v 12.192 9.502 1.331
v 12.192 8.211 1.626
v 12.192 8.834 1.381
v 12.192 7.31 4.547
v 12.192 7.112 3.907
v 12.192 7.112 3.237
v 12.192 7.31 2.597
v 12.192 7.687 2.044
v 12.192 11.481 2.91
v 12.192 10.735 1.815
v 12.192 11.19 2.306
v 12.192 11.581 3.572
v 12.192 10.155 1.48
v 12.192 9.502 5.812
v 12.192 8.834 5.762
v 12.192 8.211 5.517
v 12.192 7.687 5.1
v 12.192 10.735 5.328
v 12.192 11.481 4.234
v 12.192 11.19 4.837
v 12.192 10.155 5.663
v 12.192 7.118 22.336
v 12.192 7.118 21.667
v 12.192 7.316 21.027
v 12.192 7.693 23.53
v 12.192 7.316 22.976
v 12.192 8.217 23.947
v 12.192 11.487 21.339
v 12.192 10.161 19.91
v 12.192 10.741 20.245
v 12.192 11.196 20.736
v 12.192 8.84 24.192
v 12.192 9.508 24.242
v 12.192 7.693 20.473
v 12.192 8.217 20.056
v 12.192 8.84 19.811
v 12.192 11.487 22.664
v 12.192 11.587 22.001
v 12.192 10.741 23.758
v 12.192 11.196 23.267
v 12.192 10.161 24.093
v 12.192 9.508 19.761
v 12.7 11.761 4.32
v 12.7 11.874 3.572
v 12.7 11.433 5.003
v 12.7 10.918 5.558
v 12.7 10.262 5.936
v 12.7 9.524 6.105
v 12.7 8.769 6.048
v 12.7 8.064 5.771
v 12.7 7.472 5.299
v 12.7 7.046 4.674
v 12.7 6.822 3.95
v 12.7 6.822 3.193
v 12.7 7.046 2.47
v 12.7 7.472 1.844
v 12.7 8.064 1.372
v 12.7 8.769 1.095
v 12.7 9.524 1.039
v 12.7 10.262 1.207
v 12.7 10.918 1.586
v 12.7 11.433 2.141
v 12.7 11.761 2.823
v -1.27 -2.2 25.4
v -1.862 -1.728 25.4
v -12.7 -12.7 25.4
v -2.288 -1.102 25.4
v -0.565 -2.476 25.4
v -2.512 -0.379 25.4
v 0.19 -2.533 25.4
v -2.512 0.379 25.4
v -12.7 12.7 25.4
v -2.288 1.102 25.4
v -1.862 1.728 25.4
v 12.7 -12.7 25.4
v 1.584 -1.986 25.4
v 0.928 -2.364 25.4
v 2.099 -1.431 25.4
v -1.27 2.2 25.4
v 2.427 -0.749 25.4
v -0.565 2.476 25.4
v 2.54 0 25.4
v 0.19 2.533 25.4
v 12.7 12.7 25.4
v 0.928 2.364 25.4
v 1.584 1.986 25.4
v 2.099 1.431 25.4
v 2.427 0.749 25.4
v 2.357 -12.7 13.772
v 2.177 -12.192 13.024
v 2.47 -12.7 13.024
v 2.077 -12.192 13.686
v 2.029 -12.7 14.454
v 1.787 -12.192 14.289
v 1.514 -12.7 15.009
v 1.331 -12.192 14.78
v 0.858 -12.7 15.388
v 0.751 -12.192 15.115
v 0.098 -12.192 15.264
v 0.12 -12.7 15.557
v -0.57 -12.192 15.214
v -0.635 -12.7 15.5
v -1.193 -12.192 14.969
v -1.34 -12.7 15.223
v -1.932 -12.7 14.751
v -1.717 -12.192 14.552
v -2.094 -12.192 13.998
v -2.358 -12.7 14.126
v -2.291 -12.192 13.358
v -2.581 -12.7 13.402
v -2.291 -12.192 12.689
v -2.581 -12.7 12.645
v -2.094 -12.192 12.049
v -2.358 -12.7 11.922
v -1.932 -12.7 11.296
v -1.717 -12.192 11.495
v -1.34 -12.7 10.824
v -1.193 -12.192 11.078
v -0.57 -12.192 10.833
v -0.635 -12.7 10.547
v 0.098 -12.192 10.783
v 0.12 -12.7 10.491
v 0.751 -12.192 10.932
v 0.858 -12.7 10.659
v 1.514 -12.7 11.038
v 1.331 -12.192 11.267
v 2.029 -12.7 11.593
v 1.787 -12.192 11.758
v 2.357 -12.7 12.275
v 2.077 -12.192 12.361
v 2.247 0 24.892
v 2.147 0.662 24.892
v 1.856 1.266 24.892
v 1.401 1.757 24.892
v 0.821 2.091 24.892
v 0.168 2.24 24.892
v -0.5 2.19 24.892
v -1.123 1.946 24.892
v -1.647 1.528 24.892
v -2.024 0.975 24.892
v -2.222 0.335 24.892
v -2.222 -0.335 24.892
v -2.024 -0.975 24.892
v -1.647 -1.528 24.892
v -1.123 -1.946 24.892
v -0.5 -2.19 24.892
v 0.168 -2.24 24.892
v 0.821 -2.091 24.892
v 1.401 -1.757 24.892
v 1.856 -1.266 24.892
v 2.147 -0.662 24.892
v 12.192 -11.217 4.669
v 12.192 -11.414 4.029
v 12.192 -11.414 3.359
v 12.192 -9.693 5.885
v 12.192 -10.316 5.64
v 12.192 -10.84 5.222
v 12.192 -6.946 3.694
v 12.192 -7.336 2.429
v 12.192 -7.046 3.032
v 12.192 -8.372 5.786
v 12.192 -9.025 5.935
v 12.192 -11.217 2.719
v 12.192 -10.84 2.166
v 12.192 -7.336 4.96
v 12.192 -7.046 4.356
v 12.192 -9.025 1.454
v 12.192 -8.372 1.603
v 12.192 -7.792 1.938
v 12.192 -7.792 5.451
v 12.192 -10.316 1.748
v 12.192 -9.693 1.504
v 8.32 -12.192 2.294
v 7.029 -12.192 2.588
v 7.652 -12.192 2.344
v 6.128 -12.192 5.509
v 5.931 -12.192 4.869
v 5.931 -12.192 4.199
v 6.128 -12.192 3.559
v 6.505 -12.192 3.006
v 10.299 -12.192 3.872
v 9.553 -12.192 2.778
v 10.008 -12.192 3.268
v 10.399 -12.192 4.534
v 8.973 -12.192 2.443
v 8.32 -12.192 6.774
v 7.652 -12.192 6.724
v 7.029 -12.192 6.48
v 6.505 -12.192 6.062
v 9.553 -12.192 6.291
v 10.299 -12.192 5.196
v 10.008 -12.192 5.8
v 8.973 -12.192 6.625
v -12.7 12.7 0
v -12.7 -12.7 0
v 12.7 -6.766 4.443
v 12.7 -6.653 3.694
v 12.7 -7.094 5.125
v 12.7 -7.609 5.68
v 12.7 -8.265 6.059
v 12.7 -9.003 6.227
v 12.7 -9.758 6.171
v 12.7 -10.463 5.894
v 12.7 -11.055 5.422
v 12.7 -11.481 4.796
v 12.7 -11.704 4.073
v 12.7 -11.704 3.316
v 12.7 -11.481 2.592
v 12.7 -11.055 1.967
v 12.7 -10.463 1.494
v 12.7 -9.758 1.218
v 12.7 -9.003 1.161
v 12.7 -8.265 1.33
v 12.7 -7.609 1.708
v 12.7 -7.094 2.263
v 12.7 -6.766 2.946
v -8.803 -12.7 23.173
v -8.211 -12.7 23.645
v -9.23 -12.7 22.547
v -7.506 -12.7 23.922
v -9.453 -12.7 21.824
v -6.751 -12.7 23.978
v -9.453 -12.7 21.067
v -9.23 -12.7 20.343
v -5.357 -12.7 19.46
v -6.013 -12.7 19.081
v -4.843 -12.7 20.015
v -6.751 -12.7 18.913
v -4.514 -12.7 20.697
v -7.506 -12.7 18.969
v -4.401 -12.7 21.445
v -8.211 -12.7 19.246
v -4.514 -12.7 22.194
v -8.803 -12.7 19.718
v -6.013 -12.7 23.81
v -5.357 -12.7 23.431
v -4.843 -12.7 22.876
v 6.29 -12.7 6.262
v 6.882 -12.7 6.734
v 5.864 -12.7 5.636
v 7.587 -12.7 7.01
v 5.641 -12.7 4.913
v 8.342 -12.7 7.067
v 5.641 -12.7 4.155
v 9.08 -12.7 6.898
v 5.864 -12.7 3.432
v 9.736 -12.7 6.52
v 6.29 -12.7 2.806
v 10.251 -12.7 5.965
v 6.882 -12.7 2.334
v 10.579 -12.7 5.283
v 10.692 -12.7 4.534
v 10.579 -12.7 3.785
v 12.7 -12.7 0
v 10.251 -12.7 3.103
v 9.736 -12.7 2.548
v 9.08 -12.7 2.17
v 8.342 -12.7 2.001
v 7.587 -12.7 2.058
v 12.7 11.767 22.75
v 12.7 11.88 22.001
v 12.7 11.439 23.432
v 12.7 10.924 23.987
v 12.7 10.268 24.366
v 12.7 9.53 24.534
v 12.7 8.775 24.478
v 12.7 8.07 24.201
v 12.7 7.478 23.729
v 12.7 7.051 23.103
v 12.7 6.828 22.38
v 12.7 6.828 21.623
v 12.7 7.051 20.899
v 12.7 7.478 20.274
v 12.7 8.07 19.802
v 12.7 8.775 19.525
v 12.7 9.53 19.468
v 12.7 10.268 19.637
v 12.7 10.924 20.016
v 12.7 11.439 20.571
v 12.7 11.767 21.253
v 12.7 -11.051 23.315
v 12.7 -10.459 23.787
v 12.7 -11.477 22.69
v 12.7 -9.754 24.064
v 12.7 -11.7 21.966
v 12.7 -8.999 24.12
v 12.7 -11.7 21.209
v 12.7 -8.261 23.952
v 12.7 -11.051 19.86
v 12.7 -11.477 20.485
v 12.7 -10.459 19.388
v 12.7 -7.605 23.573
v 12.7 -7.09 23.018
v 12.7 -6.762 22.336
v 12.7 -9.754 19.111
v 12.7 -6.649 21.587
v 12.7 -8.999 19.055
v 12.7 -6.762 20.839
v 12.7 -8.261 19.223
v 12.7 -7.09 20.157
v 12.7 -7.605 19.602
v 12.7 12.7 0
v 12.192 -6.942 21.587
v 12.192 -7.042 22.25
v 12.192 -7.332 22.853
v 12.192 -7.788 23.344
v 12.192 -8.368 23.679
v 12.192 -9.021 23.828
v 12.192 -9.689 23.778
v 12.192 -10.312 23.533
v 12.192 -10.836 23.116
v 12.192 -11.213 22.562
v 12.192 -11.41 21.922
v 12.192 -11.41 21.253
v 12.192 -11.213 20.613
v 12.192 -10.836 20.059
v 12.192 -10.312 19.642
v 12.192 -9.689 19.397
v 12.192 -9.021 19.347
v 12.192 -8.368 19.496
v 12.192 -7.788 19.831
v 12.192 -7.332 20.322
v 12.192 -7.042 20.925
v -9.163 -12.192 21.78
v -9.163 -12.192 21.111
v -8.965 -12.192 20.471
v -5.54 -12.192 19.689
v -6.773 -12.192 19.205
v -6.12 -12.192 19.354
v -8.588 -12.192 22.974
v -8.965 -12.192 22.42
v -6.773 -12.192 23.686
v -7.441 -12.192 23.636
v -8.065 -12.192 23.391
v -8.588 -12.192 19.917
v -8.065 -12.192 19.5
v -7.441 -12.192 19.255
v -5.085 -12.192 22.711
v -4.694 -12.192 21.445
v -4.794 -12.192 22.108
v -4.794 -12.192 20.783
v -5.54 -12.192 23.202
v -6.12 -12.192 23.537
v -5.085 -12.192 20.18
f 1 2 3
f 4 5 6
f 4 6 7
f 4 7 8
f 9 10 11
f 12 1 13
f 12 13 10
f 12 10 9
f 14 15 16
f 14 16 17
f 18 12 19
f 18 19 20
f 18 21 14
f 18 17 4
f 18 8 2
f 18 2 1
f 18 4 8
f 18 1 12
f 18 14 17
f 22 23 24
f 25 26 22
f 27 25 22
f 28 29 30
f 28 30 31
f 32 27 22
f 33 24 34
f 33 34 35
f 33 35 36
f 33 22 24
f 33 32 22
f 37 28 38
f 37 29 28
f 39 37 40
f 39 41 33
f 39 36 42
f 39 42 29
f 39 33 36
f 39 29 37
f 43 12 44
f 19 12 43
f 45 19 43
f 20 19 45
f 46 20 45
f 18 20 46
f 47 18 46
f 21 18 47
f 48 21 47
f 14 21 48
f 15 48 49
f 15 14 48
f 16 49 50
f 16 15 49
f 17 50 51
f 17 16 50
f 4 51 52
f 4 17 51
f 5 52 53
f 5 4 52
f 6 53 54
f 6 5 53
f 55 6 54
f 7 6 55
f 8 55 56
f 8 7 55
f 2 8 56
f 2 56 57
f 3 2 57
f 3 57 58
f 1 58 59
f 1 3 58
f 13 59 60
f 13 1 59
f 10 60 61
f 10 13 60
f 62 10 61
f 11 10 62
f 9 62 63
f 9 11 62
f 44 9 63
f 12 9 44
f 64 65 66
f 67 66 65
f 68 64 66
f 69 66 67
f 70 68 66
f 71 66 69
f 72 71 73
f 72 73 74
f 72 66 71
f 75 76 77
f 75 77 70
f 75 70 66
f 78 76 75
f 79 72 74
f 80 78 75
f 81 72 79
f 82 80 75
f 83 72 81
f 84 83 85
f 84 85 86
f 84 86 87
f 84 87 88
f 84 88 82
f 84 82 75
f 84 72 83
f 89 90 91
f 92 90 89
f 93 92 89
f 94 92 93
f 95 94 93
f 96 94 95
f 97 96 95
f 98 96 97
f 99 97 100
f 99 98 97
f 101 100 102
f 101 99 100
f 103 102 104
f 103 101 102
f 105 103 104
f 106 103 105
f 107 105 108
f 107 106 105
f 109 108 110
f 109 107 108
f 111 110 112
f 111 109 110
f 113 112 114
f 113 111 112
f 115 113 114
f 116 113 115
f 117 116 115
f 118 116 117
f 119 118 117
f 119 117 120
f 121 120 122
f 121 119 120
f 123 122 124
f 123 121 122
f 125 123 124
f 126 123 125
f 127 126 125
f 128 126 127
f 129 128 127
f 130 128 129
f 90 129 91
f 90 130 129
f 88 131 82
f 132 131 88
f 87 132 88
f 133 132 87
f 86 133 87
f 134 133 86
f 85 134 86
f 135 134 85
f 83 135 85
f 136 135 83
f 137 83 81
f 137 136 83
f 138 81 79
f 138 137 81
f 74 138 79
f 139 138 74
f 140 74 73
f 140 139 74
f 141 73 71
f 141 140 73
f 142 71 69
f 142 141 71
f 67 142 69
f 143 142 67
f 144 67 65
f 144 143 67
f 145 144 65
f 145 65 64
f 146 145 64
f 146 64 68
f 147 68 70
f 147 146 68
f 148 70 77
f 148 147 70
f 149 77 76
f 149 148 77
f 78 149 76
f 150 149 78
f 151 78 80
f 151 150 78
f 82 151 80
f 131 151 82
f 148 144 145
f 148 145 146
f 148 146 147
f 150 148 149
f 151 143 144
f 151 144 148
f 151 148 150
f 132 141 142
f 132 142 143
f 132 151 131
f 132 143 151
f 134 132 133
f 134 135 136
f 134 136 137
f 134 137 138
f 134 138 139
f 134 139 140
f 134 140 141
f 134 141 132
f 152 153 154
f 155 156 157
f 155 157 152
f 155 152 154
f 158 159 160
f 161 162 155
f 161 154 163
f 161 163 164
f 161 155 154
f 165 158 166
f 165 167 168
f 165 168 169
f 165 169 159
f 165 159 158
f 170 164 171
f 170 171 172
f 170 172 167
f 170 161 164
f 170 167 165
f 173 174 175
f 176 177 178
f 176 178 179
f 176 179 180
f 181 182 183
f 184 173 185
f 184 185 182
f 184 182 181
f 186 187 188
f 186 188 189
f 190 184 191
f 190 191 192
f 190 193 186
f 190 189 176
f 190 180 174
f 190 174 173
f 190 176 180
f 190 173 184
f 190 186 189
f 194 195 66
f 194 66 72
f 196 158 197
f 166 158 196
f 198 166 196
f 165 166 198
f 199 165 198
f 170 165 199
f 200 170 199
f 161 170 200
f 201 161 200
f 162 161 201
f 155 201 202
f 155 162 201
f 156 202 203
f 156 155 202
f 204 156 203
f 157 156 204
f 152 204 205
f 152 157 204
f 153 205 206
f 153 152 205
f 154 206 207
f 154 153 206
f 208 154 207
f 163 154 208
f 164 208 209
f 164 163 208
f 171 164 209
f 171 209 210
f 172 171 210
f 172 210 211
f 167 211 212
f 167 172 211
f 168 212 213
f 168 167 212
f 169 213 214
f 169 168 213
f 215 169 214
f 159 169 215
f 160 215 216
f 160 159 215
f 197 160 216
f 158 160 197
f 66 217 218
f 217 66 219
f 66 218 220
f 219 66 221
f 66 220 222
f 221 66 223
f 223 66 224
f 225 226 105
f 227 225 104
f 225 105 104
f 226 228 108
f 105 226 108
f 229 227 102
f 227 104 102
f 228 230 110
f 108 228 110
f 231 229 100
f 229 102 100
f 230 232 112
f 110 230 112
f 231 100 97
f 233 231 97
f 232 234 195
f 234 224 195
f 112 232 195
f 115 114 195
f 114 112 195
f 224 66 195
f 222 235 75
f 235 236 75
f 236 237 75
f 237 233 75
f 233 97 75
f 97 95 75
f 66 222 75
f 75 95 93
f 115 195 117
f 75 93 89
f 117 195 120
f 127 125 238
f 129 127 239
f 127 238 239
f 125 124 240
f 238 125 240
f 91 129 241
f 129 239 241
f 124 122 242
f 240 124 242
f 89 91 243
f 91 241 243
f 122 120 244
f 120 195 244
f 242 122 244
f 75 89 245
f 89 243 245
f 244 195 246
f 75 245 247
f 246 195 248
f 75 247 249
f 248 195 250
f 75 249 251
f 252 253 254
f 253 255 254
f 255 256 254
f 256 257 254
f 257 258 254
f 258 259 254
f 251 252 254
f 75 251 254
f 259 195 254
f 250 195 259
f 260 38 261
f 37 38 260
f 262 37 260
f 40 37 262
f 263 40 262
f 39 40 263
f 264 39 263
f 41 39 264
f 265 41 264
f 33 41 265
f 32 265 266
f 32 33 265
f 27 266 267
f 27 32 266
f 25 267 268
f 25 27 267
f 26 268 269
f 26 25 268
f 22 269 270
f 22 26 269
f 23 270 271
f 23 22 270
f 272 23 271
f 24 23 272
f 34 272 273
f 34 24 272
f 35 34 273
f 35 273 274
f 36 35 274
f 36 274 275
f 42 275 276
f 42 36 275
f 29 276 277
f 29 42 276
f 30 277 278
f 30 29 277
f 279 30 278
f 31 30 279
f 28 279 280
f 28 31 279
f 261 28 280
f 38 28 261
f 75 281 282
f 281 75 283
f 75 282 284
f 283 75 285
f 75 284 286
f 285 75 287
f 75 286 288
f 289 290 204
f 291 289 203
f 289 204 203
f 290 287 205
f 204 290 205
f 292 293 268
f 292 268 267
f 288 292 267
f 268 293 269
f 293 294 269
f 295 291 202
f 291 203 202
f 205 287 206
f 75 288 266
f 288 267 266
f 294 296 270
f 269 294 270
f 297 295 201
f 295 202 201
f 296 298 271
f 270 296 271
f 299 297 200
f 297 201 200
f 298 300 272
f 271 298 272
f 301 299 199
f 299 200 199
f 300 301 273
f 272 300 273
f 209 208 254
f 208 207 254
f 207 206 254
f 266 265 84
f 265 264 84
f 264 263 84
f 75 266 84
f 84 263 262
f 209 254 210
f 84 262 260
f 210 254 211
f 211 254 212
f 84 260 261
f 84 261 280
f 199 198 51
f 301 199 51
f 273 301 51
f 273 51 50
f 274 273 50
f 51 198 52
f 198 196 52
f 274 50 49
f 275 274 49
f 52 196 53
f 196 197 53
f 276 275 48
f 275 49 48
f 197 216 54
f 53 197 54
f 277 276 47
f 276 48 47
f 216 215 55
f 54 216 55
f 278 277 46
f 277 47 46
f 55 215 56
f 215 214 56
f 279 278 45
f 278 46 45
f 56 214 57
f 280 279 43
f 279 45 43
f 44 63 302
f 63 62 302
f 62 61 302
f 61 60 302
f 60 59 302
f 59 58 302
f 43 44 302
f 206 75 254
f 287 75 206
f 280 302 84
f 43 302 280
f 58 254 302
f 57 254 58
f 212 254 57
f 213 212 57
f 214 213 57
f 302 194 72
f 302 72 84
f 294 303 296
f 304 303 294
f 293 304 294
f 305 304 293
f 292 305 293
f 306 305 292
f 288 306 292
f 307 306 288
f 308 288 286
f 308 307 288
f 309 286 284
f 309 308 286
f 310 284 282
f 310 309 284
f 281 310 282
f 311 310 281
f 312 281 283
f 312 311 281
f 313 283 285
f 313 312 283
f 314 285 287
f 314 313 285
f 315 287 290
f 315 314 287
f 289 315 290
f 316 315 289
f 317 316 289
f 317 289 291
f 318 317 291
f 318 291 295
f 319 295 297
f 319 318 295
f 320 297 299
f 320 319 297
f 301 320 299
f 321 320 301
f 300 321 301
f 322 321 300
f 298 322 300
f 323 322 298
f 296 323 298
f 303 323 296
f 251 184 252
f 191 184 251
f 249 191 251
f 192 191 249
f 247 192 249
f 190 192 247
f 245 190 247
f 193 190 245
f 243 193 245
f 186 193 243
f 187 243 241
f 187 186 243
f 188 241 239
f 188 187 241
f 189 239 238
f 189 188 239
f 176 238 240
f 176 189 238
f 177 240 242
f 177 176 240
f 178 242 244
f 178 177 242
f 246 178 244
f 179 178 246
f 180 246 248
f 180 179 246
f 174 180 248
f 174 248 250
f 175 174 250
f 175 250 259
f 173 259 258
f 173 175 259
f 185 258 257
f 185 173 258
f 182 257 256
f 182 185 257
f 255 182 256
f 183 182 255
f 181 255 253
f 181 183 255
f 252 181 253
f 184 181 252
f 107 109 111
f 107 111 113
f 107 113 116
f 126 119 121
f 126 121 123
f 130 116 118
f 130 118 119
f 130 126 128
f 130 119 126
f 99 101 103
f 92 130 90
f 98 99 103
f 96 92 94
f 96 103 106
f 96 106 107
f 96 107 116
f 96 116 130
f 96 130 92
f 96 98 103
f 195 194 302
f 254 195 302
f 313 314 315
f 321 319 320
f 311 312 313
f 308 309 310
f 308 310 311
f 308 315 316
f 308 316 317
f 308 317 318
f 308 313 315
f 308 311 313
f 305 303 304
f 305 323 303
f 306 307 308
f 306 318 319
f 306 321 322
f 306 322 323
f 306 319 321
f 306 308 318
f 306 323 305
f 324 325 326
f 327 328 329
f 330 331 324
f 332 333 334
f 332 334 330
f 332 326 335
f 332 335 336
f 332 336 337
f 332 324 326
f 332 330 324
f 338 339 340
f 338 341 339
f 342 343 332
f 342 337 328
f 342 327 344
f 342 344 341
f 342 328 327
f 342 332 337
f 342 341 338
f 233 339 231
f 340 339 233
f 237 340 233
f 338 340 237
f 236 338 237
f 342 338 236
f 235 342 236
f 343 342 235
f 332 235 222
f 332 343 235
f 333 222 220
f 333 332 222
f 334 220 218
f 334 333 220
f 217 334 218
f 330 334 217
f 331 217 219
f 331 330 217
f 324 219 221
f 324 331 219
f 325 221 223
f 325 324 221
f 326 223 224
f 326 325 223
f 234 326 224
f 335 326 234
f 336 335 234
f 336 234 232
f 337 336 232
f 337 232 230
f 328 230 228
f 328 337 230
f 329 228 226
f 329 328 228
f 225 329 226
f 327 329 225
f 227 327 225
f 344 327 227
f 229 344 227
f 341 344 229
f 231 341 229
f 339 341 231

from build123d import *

# Parameters (mm, degrees)
F0_W     = 25.4
F0_H     = 25.4
F1_DEPTH = 25.4
F2_R     = 2.54
F3_DEPTH = 0.508
F3_TAPER = 30
F4_R     = 2.54
F5_DEPTH = 0.508
F5_TAPER = 30
F6_R     = 2.54
F7_DEPTH = 0.508
F7_TAPER = 30


with BuildPart() as f1:
    # F0 (on Top) → F1 (new body)
    with BuildSketch(Plane.XY):
        Rectangle(F0_W, F0_H)
    extrude(amount=F1_DEPTH)

    # F2 (on face) → F3 (cut)
    with BuildSketch(Plane.XY.offset(25.4)):
        Circle(F2_R)
    extrude(amount=-F3_DEPTH, taper=F3_TAPER, mode=Mode.SUBTRACT)

    # F4 (on face) → F5 (cut)
    with BuildSketch(Plane.XZ.offset(12.7)):
        with Locations((-6.9411581597, 21.445404164)):
            Circle(F4_R)
        with Locations((-0.069737803, 13.023638883)):
            Circle(F4_R)
        with Locations((8.1521372762, 4.5340581903)):
            Circle(F4_R)
    extrude(amount=-F5_DEPTH, taper=F5_TAPER, mode=Mode.SUBTRACT)

    # F6 (on face) → F7 (cut)
    with BuildSketch(Plane.YZ.offset(12.7)):
        with Locations((-9.188728149, 21.5874935842)):
            Circle(F6_R)
        with Locations((9.3399413093, 22.001354984)):
            Circle(F6_R)
        with Locations((9.3340705111, 3.5717650137)):
            Circle(F6_R)
        with Locations((-9.1927518238, 3.6942041952)):
            Circle(F6_R)
    extrude(amount=-F7_DEPTH, taper=F7_TAPER, mode=Mode.SUBTRACT)


solid = f1.part
